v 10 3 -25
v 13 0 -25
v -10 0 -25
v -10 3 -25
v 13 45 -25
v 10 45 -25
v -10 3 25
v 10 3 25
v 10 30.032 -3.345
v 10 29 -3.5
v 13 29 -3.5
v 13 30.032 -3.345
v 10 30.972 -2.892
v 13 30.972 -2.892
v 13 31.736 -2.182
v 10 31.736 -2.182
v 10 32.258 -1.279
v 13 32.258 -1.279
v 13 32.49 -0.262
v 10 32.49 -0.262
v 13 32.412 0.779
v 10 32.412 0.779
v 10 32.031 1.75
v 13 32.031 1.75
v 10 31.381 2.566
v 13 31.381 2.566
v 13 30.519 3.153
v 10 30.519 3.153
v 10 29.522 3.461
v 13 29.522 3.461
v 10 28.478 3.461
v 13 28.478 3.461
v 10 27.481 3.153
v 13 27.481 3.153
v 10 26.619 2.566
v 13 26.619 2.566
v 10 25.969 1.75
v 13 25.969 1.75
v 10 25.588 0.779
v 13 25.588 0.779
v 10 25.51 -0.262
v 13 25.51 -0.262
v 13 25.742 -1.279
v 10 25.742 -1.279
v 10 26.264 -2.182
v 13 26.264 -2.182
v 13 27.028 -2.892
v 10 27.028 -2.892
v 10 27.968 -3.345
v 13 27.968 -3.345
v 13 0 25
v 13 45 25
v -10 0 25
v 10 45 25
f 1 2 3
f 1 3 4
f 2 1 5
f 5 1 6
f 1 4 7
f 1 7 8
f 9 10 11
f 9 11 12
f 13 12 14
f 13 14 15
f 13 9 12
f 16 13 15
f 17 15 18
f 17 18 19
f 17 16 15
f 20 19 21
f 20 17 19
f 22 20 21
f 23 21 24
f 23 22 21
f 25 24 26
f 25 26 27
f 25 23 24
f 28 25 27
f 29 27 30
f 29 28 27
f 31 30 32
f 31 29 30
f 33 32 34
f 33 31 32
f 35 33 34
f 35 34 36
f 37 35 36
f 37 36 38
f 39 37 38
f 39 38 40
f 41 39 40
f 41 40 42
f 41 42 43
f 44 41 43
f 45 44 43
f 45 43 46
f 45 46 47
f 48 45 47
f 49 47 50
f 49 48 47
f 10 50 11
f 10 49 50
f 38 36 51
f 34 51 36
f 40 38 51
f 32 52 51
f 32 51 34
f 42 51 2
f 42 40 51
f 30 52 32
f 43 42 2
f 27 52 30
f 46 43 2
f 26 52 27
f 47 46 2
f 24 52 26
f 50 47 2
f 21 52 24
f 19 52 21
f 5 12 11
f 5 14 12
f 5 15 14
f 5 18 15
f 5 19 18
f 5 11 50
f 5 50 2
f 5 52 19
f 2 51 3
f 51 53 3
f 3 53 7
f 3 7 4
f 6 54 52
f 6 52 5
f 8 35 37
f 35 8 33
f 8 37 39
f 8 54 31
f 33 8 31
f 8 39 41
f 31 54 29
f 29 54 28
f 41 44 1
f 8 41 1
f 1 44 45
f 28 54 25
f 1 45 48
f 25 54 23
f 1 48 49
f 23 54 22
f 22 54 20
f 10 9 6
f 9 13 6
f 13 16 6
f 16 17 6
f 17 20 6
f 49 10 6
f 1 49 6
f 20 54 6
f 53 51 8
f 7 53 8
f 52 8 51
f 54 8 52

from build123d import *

# Parameters (mm, degrees)
SKETCH1_W           = 20
SKETCH1_H           = 50
BOSS_EXTRUDE1_DEPTH = 3
SKETCH2_W           = 50
SKETCH2_H           = 45
SKETCH2_R           = 3.5
BOSS_EXTRUDE2_DEPTH = 3


with BuildPart() as part:
    # Sketch1 → Boss-Extrude1 (new body)
    with BuildSketch(Plane(origin=(0, 0, 0), x_dir=(1, 0, 0), z_dir=(0, 1, 0))):
        Rectangle(SKETCH1_W, SKETCH1_H)
    extrude(amount=BOSS_EXTRUDE1_DEPTH)

    # Sketch2 → Boss-Extrude2 (add)
    with BuildSketch(Plane(origin=(10, 0, 0), x_dir=(0, 0, -1), z_dir=(1, 0, 0))):
        with Locations((0, 22.5)):
            Rectangle(SKETCH2_W, SKETCH2_H)
        with Locations((0, 29)):
            Circle(SKETCH2_R, mode=Mode.SUBTRACT)
    extrude(amount=BOSS_EXTRUDE2_DEPTH)


solid = part.part
